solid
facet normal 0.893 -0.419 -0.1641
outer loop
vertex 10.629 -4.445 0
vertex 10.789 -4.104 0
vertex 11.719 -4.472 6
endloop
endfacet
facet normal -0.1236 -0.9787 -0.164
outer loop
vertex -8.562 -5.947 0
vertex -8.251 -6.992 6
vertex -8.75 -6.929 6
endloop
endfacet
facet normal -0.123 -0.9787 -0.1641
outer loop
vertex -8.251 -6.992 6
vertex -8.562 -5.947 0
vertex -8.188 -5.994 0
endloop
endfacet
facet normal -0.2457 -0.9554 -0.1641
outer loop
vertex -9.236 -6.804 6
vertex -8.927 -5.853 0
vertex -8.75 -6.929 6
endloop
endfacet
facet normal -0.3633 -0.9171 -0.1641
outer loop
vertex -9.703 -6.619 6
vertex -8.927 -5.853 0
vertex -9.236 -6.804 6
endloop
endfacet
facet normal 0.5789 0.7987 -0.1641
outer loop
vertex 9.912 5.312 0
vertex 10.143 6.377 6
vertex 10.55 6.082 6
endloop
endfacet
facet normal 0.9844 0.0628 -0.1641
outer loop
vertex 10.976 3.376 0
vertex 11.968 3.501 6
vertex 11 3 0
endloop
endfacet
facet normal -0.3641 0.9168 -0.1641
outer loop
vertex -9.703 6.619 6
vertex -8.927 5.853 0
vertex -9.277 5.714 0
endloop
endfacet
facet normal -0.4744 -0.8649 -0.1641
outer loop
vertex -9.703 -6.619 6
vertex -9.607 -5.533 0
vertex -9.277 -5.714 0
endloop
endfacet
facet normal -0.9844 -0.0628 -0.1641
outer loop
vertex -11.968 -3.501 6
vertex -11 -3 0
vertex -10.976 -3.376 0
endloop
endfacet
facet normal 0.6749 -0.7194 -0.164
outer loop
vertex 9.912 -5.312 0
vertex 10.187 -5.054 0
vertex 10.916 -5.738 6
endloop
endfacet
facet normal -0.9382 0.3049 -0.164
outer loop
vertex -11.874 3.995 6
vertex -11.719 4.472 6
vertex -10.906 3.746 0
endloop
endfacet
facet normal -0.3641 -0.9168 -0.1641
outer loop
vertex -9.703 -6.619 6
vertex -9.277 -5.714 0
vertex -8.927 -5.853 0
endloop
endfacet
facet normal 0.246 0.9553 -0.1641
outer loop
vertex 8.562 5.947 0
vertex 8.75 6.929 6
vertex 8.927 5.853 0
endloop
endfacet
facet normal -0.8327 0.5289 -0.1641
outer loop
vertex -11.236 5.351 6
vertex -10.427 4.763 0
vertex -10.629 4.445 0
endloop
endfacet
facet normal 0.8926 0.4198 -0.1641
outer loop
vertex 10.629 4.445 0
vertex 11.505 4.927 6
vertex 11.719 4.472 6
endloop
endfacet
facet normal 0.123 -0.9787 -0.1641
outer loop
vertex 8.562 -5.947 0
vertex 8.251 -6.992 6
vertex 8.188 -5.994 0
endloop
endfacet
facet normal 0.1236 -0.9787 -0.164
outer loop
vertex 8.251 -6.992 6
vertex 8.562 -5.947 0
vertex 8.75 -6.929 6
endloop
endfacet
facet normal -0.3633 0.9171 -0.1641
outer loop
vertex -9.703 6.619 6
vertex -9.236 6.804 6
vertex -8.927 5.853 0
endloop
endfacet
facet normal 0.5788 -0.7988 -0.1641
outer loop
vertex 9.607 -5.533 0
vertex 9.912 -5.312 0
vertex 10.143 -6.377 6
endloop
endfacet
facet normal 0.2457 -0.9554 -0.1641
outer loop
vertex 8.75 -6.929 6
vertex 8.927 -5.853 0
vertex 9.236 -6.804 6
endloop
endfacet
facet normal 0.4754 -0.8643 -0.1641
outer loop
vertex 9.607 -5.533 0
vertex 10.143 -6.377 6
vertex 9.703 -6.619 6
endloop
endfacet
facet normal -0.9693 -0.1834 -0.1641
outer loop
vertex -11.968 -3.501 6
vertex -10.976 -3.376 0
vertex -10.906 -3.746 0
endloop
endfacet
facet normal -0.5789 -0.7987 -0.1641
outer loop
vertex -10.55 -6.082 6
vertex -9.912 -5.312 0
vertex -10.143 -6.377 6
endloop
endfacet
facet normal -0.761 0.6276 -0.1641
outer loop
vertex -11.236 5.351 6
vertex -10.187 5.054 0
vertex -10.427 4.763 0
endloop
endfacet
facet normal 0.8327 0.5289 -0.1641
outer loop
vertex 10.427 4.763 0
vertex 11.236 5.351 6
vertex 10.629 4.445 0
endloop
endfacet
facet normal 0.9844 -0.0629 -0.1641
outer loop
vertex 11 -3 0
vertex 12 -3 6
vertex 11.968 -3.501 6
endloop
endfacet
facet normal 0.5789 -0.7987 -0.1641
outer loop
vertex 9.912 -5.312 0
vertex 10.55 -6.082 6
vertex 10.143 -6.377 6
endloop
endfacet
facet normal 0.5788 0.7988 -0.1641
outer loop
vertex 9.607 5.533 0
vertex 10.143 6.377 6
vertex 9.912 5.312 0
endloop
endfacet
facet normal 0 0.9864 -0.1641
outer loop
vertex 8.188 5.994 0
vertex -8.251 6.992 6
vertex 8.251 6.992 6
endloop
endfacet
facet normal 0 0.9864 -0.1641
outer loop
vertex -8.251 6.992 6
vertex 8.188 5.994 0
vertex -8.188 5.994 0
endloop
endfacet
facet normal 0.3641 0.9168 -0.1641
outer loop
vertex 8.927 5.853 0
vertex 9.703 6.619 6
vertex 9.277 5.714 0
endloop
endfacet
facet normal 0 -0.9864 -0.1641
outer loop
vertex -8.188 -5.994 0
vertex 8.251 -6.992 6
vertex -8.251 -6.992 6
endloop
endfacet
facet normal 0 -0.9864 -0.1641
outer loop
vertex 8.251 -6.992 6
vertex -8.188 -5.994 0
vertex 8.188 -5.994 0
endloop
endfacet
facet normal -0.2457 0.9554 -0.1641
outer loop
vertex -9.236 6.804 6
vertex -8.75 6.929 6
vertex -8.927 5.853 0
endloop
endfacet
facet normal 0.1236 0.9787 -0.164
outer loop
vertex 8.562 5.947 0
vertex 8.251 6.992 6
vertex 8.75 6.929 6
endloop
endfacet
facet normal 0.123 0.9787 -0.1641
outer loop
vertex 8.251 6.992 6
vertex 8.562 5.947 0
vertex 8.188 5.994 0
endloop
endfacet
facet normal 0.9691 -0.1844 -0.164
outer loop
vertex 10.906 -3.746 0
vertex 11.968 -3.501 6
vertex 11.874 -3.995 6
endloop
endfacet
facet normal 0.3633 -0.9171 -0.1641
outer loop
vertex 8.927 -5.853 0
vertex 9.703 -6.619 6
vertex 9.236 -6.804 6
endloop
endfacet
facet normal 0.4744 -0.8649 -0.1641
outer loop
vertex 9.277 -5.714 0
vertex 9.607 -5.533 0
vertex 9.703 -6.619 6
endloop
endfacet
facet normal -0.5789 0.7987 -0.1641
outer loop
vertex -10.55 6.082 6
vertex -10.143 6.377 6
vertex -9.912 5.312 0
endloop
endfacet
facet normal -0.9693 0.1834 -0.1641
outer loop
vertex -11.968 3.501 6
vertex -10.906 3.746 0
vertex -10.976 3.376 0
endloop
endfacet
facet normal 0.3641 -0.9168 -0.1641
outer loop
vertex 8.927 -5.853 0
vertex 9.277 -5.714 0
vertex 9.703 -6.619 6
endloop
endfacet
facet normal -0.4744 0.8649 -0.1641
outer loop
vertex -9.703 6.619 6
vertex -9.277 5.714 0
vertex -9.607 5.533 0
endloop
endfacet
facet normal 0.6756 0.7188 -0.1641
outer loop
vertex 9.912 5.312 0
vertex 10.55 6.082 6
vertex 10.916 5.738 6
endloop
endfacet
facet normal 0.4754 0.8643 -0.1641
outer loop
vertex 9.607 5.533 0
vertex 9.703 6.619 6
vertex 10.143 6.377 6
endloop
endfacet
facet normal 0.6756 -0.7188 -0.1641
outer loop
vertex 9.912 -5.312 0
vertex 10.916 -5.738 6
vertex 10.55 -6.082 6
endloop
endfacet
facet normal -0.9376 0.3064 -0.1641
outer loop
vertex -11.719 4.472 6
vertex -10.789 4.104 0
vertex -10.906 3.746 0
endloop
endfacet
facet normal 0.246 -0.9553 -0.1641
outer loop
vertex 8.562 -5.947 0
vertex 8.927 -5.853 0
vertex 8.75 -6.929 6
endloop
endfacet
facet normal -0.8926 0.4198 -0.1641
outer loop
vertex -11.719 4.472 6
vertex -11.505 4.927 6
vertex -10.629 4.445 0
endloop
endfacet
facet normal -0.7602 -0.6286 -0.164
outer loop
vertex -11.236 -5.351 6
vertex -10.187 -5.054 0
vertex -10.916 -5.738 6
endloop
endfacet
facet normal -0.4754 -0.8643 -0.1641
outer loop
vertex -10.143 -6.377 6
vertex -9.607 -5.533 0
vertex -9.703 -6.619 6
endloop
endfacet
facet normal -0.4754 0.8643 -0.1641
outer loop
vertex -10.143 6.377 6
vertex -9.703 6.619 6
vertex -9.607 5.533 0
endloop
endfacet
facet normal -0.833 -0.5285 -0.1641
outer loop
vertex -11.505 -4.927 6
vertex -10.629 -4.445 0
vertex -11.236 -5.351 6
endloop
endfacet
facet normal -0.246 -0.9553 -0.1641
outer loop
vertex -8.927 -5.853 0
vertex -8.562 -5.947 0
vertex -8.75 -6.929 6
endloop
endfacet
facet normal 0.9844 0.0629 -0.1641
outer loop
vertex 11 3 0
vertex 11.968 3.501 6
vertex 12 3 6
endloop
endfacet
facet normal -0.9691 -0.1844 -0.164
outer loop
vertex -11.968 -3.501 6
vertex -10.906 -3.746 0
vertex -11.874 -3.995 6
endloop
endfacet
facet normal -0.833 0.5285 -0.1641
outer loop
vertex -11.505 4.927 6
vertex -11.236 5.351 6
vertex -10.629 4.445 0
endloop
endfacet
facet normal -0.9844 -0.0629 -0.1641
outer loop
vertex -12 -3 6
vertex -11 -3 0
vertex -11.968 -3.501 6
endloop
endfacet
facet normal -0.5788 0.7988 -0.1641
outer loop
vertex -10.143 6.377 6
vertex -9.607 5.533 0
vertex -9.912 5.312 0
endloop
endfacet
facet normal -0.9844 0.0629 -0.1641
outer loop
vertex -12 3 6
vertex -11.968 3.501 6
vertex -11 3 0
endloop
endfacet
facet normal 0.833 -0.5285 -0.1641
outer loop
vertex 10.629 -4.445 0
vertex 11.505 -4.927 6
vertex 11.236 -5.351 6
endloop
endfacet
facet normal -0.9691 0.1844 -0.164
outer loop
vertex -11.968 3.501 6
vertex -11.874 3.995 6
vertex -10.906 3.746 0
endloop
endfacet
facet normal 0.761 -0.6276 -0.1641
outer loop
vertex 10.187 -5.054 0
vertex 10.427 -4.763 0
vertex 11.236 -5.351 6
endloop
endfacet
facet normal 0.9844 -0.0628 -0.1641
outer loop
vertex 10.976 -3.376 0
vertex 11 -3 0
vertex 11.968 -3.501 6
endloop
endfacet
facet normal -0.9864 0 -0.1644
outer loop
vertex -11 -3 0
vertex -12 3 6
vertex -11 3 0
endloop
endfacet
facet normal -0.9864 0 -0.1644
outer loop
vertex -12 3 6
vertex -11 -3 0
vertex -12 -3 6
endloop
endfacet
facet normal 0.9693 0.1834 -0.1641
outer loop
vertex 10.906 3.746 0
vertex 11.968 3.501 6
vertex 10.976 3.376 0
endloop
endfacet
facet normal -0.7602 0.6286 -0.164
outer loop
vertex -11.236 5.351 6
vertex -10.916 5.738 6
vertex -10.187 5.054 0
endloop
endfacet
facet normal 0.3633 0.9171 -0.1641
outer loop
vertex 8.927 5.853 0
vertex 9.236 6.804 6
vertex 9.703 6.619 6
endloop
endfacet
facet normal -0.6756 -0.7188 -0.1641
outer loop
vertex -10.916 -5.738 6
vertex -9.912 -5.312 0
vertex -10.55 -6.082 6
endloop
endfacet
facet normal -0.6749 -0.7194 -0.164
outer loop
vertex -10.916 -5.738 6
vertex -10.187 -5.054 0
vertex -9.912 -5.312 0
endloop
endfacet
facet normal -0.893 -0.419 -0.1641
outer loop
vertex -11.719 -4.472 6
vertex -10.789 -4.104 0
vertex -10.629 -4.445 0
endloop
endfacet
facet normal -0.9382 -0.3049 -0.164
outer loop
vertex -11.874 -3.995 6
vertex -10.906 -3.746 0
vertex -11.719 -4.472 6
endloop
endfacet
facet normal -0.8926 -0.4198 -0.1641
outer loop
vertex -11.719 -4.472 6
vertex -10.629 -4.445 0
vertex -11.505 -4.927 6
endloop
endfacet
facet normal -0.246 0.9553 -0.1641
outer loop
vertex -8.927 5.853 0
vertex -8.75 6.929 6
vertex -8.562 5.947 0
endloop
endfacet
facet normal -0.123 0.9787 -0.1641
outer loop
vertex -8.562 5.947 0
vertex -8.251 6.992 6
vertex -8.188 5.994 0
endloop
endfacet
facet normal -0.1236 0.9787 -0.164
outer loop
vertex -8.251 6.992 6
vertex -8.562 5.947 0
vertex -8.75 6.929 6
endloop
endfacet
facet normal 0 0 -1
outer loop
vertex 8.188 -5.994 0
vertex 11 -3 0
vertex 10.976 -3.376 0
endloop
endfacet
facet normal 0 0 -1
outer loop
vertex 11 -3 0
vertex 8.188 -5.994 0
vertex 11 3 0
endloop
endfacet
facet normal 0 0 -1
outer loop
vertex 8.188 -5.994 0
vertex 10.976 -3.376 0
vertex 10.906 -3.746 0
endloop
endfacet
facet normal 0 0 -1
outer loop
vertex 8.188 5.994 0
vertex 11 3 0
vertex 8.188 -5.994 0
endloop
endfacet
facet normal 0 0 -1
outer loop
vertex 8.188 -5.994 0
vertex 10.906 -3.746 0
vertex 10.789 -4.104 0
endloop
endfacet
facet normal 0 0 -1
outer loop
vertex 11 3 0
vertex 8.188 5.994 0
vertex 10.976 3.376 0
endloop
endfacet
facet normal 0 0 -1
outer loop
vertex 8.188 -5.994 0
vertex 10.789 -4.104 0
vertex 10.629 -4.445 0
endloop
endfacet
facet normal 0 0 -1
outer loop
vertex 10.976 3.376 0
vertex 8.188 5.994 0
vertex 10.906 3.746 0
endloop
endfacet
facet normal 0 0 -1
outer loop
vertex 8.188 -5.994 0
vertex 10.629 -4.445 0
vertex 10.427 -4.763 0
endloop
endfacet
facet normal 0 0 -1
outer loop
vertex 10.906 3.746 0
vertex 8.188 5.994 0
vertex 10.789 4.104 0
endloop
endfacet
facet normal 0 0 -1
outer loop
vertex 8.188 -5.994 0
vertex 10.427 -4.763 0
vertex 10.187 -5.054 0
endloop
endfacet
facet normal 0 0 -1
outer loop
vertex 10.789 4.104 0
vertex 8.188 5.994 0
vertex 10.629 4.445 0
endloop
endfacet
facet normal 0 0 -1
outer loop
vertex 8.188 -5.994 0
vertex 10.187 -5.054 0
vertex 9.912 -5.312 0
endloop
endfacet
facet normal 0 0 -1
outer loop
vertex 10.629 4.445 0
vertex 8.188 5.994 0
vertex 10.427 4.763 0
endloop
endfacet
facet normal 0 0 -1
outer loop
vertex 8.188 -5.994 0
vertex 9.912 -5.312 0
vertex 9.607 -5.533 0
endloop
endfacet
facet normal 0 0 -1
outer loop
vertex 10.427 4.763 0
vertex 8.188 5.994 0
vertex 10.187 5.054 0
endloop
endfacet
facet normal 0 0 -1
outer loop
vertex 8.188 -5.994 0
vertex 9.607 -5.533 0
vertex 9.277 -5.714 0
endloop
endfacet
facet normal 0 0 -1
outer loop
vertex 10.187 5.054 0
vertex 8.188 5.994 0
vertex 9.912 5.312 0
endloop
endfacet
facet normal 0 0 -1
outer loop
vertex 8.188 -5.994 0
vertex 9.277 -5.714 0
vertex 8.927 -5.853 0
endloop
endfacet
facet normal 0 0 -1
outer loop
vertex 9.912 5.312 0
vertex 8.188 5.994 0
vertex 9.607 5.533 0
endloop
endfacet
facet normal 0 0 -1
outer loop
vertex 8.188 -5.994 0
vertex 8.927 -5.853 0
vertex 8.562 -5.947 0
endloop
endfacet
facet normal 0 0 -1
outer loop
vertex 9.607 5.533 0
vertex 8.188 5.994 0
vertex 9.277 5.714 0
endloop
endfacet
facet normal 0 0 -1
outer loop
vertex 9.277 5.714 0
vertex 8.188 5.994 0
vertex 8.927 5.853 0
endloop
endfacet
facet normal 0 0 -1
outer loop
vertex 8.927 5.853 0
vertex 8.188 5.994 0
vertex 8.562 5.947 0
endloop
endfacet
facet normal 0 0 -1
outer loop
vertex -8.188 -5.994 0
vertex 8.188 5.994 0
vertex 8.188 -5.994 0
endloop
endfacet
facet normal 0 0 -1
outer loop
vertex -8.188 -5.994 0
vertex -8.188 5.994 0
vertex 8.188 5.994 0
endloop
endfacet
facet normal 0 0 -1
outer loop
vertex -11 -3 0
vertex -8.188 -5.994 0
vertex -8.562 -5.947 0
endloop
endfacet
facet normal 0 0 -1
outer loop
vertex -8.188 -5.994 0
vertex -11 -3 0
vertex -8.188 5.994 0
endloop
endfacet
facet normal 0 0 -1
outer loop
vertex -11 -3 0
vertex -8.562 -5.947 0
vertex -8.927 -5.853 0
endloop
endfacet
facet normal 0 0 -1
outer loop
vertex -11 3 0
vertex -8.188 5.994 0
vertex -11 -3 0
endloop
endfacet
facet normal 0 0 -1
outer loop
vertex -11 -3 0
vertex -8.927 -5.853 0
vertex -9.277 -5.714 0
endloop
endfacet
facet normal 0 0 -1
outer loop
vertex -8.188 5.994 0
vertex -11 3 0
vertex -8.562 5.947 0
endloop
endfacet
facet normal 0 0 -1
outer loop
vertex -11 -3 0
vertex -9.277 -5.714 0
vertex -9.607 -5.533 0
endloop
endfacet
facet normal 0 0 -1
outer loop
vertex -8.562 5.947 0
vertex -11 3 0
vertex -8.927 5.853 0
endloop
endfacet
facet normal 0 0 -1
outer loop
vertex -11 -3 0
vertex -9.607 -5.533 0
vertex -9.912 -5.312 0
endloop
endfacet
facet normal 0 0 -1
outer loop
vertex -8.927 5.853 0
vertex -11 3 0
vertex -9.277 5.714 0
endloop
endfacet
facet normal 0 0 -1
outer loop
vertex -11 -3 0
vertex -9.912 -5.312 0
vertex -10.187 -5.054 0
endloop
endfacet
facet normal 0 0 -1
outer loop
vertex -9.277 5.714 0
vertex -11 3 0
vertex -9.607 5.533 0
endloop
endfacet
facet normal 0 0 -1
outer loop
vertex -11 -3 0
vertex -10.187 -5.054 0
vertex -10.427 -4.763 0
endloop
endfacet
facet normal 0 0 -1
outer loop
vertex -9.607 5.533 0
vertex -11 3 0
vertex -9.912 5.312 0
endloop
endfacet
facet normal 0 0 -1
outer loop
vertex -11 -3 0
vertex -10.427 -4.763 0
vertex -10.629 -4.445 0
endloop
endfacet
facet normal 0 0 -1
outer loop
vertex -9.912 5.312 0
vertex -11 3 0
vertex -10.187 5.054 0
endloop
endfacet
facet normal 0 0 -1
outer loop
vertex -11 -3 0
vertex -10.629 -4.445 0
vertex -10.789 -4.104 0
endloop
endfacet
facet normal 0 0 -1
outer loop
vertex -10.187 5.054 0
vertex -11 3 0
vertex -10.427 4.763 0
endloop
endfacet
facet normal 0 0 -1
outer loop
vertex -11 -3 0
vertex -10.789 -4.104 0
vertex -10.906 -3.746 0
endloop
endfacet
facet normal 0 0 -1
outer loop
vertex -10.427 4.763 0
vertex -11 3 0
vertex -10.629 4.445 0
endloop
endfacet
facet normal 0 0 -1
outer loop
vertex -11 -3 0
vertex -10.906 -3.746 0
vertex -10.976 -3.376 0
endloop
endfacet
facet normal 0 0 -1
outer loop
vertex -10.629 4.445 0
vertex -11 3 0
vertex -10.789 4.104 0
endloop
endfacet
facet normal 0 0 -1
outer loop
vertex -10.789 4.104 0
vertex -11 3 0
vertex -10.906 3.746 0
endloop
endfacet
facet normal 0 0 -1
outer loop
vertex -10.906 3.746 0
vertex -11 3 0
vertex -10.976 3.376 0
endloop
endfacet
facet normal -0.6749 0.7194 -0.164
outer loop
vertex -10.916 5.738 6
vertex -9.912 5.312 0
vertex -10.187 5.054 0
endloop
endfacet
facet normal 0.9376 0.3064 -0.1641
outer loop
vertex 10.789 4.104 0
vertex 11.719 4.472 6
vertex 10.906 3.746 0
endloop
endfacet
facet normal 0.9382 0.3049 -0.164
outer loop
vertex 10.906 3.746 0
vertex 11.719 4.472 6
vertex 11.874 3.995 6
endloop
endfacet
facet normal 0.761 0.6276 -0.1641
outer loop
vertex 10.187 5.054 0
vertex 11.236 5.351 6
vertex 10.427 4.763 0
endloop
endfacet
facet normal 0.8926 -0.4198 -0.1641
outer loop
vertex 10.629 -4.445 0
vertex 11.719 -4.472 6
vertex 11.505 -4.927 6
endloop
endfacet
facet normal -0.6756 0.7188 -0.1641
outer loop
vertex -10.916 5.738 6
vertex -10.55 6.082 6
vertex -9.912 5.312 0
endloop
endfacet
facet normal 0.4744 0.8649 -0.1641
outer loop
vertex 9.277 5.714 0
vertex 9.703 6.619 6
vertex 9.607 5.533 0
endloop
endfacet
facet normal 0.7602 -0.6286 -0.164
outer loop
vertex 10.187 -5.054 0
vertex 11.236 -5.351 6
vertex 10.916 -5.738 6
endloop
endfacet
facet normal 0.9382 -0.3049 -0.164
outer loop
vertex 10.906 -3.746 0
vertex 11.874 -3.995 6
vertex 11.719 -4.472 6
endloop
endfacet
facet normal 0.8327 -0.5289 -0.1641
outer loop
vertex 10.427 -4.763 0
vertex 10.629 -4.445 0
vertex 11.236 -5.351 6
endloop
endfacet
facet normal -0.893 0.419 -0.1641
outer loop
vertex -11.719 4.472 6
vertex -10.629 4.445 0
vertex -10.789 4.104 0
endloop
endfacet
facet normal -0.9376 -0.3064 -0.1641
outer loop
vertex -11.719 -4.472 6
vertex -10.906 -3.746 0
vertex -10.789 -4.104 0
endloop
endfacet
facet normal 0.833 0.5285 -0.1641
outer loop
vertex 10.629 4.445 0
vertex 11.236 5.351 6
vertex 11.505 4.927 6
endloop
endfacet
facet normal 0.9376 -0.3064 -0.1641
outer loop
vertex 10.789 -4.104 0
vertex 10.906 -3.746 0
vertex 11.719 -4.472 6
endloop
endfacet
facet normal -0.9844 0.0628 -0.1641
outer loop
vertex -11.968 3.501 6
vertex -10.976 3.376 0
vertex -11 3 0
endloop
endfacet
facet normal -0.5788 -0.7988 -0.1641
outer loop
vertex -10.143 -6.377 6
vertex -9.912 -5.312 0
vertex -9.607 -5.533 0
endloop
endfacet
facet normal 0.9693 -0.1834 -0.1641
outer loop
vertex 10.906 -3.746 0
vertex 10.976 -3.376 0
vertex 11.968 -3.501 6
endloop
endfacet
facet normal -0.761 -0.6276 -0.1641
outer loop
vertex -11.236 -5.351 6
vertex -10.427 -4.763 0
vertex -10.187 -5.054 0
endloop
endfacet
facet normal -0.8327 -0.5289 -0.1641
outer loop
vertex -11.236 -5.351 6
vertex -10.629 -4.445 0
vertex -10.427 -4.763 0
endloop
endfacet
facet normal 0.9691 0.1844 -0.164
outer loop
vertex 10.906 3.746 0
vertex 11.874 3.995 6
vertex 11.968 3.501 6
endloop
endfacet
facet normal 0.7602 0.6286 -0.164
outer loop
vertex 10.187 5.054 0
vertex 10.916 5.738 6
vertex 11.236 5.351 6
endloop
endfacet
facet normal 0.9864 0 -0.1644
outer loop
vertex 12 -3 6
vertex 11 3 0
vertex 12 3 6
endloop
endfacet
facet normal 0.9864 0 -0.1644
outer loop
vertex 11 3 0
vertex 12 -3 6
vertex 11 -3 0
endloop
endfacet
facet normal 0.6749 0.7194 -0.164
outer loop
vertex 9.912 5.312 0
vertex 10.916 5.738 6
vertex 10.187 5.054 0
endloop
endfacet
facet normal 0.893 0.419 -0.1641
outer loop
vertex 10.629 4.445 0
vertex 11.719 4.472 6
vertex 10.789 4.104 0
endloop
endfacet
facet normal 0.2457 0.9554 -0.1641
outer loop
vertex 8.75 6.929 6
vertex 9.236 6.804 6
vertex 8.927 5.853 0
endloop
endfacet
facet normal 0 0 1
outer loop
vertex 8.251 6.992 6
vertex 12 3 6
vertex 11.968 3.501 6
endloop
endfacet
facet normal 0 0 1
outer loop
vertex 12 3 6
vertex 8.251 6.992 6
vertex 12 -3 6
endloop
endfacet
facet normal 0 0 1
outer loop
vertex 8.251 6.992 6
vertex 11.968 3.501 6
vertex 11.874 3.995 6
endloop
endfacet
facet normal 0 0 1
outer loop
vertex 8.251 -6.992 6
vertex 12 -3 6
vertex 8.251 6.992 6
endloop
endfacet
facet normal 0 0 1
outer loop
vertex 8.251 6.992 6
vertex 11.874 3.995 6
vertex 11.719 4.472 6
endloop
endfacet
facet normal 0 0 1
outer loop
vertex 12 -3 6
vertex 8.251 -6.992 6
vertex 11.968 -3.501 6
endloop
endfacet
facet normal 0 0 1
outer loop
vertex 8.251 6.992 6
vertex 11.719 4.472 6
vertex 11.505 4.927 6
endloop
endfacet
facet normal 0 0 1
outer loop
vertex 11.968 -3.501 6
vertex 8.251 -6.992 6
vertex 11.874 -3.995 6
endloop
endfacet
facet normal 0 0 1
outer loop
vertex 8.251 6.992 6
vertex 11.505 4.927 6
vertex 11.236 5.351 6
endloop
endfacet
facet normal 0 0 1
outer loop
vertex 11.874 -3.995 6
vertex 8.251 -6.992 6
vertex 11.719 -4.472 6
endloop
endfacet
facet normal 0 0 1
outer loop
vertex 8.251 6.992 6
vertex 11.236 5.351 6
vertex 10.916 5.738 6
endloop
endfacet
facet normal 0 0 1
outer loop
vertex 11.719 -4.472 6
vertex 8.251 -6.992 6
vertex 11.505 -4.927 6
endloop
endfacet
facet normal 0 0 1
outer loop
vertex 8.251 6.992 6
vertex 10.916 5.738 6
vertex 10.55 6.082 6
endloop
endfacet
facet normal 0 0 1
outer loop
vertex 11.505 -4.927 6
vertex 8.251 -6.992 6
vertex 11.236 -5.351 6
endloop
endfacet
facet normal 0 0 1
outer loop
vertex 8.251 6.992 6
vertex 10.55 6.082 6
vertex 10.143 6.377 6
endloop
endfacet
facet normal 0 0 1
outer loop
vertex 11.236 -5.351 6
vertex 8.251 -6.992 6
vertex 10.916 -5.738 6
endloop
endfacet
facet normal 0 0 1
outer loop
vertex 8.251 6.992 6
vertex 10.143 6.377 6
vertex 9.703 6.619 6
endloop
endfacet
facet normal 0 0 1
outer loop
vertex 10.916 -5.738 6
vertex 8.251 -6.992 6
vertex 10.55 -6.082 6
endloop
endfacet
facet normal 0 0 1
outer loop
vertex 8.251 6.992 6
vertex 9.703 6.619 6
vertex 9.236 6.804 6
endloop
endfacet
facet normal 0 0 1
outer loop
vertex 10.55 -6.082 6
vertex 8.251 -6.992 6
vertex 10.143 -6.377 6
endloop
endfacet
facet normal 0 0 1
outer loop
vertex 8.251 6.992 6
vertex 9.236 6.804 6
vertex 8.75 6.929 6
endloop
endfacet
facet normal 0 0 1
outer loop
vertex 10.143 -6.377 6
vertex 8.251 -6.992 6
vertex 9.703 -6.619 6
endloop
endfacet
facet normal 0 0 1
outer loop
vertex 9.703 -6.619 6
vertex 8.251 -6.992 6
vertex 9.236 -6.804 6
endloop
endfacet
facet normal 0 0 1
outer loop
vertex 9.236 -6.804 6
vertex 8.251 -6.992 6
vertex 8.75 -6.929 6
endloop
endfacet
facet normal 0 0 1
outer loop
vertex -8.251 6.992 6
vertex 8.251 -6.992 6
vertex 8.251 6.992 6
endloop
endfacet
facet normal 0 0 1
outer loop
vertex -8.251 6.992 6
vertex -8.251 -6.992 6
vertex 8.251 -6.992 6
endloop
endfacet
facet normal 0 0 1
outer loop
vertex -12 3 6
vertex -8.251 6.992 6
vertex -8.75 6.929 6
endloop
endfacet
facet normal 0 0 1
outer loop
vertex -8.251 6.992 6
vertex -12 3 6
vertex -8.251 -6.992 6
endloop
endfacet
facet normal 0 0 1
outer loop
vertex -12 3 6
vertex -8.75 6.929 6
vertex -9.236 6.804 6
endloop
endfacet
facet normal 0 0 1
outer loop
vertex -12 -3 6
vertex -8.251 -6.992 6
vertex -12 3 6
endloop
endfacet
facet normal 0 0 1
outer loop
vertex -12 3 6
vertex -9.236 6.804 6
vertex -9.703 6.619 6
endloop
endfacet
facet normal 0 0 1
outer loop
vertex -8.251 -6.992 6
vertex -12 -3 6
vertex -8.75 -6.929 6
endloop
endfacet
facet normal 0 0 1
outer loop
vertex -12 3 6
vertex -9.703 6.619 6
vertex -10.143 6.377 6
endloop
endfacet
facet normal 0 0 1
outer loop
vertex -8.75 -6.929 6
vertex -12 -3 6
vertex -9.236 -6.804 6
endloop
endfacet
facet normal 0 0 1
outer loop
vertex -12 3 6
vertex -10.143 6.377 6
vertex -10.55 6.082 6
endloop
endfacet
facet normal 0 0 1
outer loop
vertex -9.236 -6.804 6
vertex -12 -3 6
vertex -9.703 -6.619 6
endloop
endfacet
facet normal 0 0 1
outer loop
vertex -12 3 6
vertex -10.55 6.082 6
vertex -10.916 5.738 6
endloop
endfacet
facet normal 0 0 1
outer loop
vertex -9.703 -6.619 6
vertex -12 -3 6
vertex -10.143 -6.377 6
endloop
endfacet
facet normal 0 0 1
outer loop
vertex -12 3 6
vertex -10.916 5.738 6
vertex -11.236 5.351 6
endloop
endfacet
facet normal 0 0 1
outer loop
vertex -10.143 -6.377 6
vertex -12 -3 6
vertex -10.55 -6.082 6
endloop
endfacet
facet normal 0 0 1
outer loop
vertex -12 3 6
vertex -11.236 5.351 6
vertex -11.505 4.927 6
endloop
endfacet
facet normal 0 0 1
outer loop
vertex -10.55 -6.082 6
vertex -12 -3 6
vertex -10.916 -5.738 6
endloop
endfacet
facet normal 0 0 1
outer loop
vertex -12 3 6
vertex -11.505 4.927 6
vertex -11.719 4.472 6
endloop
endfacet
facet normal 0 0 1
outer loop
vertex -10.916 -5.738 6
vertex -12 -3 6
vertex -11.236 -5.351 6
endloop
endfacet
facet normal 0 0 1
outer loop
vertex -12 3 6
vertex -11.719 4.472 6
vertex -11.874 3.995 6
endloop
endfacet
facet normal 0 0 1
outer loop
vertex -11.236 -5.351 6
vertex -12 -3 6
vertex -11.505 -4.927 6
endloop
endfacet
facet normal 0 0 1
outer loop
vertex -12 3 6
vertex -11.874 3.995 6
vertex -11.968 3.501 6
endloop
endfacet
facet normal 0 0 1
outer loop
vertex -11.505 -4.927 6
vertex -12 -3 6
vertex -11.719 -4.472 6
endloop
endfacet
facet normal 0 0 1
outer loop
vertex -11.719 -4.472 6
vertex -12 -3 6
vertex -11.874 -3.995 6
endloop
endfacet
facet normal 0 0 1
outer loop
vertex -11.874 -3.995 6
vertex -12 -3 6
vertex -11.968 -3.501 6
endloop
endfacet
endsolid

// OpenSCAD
$fn = 50;

difference() {
	union() {
		rotate(a = [0, 180, 0]) {
			hull() {
				translate(v = [-8.0, 3.0, 0]) {
					rotate(a = [0, 180, 0]) {
						cylinder(h = 6, r1 = 3.0, r2 = 4);
					}
				}
				translate(v = [8.0, 3.0, 0]) {
					rotate(a = [0, 180, 0]) {
						cylinder(h = 6, r1 = 3.0, r2 = 4);
					}
				}
				translate(v = [-8.0, -3.0, 0]) {
					rotate(a = [0, 180, 0]) {
						cylinder(h = 6, r1 = 3.0, r2 = 4);
					}
				}
				translate(v = [8.0, -3.0, 0]) {
					rotate(a = [0, 180, 0]) {
						cylinder(h = 6, r1 = 3.0, r2 = 4);
					}
				}
			}
		}
	}
	union();
}
